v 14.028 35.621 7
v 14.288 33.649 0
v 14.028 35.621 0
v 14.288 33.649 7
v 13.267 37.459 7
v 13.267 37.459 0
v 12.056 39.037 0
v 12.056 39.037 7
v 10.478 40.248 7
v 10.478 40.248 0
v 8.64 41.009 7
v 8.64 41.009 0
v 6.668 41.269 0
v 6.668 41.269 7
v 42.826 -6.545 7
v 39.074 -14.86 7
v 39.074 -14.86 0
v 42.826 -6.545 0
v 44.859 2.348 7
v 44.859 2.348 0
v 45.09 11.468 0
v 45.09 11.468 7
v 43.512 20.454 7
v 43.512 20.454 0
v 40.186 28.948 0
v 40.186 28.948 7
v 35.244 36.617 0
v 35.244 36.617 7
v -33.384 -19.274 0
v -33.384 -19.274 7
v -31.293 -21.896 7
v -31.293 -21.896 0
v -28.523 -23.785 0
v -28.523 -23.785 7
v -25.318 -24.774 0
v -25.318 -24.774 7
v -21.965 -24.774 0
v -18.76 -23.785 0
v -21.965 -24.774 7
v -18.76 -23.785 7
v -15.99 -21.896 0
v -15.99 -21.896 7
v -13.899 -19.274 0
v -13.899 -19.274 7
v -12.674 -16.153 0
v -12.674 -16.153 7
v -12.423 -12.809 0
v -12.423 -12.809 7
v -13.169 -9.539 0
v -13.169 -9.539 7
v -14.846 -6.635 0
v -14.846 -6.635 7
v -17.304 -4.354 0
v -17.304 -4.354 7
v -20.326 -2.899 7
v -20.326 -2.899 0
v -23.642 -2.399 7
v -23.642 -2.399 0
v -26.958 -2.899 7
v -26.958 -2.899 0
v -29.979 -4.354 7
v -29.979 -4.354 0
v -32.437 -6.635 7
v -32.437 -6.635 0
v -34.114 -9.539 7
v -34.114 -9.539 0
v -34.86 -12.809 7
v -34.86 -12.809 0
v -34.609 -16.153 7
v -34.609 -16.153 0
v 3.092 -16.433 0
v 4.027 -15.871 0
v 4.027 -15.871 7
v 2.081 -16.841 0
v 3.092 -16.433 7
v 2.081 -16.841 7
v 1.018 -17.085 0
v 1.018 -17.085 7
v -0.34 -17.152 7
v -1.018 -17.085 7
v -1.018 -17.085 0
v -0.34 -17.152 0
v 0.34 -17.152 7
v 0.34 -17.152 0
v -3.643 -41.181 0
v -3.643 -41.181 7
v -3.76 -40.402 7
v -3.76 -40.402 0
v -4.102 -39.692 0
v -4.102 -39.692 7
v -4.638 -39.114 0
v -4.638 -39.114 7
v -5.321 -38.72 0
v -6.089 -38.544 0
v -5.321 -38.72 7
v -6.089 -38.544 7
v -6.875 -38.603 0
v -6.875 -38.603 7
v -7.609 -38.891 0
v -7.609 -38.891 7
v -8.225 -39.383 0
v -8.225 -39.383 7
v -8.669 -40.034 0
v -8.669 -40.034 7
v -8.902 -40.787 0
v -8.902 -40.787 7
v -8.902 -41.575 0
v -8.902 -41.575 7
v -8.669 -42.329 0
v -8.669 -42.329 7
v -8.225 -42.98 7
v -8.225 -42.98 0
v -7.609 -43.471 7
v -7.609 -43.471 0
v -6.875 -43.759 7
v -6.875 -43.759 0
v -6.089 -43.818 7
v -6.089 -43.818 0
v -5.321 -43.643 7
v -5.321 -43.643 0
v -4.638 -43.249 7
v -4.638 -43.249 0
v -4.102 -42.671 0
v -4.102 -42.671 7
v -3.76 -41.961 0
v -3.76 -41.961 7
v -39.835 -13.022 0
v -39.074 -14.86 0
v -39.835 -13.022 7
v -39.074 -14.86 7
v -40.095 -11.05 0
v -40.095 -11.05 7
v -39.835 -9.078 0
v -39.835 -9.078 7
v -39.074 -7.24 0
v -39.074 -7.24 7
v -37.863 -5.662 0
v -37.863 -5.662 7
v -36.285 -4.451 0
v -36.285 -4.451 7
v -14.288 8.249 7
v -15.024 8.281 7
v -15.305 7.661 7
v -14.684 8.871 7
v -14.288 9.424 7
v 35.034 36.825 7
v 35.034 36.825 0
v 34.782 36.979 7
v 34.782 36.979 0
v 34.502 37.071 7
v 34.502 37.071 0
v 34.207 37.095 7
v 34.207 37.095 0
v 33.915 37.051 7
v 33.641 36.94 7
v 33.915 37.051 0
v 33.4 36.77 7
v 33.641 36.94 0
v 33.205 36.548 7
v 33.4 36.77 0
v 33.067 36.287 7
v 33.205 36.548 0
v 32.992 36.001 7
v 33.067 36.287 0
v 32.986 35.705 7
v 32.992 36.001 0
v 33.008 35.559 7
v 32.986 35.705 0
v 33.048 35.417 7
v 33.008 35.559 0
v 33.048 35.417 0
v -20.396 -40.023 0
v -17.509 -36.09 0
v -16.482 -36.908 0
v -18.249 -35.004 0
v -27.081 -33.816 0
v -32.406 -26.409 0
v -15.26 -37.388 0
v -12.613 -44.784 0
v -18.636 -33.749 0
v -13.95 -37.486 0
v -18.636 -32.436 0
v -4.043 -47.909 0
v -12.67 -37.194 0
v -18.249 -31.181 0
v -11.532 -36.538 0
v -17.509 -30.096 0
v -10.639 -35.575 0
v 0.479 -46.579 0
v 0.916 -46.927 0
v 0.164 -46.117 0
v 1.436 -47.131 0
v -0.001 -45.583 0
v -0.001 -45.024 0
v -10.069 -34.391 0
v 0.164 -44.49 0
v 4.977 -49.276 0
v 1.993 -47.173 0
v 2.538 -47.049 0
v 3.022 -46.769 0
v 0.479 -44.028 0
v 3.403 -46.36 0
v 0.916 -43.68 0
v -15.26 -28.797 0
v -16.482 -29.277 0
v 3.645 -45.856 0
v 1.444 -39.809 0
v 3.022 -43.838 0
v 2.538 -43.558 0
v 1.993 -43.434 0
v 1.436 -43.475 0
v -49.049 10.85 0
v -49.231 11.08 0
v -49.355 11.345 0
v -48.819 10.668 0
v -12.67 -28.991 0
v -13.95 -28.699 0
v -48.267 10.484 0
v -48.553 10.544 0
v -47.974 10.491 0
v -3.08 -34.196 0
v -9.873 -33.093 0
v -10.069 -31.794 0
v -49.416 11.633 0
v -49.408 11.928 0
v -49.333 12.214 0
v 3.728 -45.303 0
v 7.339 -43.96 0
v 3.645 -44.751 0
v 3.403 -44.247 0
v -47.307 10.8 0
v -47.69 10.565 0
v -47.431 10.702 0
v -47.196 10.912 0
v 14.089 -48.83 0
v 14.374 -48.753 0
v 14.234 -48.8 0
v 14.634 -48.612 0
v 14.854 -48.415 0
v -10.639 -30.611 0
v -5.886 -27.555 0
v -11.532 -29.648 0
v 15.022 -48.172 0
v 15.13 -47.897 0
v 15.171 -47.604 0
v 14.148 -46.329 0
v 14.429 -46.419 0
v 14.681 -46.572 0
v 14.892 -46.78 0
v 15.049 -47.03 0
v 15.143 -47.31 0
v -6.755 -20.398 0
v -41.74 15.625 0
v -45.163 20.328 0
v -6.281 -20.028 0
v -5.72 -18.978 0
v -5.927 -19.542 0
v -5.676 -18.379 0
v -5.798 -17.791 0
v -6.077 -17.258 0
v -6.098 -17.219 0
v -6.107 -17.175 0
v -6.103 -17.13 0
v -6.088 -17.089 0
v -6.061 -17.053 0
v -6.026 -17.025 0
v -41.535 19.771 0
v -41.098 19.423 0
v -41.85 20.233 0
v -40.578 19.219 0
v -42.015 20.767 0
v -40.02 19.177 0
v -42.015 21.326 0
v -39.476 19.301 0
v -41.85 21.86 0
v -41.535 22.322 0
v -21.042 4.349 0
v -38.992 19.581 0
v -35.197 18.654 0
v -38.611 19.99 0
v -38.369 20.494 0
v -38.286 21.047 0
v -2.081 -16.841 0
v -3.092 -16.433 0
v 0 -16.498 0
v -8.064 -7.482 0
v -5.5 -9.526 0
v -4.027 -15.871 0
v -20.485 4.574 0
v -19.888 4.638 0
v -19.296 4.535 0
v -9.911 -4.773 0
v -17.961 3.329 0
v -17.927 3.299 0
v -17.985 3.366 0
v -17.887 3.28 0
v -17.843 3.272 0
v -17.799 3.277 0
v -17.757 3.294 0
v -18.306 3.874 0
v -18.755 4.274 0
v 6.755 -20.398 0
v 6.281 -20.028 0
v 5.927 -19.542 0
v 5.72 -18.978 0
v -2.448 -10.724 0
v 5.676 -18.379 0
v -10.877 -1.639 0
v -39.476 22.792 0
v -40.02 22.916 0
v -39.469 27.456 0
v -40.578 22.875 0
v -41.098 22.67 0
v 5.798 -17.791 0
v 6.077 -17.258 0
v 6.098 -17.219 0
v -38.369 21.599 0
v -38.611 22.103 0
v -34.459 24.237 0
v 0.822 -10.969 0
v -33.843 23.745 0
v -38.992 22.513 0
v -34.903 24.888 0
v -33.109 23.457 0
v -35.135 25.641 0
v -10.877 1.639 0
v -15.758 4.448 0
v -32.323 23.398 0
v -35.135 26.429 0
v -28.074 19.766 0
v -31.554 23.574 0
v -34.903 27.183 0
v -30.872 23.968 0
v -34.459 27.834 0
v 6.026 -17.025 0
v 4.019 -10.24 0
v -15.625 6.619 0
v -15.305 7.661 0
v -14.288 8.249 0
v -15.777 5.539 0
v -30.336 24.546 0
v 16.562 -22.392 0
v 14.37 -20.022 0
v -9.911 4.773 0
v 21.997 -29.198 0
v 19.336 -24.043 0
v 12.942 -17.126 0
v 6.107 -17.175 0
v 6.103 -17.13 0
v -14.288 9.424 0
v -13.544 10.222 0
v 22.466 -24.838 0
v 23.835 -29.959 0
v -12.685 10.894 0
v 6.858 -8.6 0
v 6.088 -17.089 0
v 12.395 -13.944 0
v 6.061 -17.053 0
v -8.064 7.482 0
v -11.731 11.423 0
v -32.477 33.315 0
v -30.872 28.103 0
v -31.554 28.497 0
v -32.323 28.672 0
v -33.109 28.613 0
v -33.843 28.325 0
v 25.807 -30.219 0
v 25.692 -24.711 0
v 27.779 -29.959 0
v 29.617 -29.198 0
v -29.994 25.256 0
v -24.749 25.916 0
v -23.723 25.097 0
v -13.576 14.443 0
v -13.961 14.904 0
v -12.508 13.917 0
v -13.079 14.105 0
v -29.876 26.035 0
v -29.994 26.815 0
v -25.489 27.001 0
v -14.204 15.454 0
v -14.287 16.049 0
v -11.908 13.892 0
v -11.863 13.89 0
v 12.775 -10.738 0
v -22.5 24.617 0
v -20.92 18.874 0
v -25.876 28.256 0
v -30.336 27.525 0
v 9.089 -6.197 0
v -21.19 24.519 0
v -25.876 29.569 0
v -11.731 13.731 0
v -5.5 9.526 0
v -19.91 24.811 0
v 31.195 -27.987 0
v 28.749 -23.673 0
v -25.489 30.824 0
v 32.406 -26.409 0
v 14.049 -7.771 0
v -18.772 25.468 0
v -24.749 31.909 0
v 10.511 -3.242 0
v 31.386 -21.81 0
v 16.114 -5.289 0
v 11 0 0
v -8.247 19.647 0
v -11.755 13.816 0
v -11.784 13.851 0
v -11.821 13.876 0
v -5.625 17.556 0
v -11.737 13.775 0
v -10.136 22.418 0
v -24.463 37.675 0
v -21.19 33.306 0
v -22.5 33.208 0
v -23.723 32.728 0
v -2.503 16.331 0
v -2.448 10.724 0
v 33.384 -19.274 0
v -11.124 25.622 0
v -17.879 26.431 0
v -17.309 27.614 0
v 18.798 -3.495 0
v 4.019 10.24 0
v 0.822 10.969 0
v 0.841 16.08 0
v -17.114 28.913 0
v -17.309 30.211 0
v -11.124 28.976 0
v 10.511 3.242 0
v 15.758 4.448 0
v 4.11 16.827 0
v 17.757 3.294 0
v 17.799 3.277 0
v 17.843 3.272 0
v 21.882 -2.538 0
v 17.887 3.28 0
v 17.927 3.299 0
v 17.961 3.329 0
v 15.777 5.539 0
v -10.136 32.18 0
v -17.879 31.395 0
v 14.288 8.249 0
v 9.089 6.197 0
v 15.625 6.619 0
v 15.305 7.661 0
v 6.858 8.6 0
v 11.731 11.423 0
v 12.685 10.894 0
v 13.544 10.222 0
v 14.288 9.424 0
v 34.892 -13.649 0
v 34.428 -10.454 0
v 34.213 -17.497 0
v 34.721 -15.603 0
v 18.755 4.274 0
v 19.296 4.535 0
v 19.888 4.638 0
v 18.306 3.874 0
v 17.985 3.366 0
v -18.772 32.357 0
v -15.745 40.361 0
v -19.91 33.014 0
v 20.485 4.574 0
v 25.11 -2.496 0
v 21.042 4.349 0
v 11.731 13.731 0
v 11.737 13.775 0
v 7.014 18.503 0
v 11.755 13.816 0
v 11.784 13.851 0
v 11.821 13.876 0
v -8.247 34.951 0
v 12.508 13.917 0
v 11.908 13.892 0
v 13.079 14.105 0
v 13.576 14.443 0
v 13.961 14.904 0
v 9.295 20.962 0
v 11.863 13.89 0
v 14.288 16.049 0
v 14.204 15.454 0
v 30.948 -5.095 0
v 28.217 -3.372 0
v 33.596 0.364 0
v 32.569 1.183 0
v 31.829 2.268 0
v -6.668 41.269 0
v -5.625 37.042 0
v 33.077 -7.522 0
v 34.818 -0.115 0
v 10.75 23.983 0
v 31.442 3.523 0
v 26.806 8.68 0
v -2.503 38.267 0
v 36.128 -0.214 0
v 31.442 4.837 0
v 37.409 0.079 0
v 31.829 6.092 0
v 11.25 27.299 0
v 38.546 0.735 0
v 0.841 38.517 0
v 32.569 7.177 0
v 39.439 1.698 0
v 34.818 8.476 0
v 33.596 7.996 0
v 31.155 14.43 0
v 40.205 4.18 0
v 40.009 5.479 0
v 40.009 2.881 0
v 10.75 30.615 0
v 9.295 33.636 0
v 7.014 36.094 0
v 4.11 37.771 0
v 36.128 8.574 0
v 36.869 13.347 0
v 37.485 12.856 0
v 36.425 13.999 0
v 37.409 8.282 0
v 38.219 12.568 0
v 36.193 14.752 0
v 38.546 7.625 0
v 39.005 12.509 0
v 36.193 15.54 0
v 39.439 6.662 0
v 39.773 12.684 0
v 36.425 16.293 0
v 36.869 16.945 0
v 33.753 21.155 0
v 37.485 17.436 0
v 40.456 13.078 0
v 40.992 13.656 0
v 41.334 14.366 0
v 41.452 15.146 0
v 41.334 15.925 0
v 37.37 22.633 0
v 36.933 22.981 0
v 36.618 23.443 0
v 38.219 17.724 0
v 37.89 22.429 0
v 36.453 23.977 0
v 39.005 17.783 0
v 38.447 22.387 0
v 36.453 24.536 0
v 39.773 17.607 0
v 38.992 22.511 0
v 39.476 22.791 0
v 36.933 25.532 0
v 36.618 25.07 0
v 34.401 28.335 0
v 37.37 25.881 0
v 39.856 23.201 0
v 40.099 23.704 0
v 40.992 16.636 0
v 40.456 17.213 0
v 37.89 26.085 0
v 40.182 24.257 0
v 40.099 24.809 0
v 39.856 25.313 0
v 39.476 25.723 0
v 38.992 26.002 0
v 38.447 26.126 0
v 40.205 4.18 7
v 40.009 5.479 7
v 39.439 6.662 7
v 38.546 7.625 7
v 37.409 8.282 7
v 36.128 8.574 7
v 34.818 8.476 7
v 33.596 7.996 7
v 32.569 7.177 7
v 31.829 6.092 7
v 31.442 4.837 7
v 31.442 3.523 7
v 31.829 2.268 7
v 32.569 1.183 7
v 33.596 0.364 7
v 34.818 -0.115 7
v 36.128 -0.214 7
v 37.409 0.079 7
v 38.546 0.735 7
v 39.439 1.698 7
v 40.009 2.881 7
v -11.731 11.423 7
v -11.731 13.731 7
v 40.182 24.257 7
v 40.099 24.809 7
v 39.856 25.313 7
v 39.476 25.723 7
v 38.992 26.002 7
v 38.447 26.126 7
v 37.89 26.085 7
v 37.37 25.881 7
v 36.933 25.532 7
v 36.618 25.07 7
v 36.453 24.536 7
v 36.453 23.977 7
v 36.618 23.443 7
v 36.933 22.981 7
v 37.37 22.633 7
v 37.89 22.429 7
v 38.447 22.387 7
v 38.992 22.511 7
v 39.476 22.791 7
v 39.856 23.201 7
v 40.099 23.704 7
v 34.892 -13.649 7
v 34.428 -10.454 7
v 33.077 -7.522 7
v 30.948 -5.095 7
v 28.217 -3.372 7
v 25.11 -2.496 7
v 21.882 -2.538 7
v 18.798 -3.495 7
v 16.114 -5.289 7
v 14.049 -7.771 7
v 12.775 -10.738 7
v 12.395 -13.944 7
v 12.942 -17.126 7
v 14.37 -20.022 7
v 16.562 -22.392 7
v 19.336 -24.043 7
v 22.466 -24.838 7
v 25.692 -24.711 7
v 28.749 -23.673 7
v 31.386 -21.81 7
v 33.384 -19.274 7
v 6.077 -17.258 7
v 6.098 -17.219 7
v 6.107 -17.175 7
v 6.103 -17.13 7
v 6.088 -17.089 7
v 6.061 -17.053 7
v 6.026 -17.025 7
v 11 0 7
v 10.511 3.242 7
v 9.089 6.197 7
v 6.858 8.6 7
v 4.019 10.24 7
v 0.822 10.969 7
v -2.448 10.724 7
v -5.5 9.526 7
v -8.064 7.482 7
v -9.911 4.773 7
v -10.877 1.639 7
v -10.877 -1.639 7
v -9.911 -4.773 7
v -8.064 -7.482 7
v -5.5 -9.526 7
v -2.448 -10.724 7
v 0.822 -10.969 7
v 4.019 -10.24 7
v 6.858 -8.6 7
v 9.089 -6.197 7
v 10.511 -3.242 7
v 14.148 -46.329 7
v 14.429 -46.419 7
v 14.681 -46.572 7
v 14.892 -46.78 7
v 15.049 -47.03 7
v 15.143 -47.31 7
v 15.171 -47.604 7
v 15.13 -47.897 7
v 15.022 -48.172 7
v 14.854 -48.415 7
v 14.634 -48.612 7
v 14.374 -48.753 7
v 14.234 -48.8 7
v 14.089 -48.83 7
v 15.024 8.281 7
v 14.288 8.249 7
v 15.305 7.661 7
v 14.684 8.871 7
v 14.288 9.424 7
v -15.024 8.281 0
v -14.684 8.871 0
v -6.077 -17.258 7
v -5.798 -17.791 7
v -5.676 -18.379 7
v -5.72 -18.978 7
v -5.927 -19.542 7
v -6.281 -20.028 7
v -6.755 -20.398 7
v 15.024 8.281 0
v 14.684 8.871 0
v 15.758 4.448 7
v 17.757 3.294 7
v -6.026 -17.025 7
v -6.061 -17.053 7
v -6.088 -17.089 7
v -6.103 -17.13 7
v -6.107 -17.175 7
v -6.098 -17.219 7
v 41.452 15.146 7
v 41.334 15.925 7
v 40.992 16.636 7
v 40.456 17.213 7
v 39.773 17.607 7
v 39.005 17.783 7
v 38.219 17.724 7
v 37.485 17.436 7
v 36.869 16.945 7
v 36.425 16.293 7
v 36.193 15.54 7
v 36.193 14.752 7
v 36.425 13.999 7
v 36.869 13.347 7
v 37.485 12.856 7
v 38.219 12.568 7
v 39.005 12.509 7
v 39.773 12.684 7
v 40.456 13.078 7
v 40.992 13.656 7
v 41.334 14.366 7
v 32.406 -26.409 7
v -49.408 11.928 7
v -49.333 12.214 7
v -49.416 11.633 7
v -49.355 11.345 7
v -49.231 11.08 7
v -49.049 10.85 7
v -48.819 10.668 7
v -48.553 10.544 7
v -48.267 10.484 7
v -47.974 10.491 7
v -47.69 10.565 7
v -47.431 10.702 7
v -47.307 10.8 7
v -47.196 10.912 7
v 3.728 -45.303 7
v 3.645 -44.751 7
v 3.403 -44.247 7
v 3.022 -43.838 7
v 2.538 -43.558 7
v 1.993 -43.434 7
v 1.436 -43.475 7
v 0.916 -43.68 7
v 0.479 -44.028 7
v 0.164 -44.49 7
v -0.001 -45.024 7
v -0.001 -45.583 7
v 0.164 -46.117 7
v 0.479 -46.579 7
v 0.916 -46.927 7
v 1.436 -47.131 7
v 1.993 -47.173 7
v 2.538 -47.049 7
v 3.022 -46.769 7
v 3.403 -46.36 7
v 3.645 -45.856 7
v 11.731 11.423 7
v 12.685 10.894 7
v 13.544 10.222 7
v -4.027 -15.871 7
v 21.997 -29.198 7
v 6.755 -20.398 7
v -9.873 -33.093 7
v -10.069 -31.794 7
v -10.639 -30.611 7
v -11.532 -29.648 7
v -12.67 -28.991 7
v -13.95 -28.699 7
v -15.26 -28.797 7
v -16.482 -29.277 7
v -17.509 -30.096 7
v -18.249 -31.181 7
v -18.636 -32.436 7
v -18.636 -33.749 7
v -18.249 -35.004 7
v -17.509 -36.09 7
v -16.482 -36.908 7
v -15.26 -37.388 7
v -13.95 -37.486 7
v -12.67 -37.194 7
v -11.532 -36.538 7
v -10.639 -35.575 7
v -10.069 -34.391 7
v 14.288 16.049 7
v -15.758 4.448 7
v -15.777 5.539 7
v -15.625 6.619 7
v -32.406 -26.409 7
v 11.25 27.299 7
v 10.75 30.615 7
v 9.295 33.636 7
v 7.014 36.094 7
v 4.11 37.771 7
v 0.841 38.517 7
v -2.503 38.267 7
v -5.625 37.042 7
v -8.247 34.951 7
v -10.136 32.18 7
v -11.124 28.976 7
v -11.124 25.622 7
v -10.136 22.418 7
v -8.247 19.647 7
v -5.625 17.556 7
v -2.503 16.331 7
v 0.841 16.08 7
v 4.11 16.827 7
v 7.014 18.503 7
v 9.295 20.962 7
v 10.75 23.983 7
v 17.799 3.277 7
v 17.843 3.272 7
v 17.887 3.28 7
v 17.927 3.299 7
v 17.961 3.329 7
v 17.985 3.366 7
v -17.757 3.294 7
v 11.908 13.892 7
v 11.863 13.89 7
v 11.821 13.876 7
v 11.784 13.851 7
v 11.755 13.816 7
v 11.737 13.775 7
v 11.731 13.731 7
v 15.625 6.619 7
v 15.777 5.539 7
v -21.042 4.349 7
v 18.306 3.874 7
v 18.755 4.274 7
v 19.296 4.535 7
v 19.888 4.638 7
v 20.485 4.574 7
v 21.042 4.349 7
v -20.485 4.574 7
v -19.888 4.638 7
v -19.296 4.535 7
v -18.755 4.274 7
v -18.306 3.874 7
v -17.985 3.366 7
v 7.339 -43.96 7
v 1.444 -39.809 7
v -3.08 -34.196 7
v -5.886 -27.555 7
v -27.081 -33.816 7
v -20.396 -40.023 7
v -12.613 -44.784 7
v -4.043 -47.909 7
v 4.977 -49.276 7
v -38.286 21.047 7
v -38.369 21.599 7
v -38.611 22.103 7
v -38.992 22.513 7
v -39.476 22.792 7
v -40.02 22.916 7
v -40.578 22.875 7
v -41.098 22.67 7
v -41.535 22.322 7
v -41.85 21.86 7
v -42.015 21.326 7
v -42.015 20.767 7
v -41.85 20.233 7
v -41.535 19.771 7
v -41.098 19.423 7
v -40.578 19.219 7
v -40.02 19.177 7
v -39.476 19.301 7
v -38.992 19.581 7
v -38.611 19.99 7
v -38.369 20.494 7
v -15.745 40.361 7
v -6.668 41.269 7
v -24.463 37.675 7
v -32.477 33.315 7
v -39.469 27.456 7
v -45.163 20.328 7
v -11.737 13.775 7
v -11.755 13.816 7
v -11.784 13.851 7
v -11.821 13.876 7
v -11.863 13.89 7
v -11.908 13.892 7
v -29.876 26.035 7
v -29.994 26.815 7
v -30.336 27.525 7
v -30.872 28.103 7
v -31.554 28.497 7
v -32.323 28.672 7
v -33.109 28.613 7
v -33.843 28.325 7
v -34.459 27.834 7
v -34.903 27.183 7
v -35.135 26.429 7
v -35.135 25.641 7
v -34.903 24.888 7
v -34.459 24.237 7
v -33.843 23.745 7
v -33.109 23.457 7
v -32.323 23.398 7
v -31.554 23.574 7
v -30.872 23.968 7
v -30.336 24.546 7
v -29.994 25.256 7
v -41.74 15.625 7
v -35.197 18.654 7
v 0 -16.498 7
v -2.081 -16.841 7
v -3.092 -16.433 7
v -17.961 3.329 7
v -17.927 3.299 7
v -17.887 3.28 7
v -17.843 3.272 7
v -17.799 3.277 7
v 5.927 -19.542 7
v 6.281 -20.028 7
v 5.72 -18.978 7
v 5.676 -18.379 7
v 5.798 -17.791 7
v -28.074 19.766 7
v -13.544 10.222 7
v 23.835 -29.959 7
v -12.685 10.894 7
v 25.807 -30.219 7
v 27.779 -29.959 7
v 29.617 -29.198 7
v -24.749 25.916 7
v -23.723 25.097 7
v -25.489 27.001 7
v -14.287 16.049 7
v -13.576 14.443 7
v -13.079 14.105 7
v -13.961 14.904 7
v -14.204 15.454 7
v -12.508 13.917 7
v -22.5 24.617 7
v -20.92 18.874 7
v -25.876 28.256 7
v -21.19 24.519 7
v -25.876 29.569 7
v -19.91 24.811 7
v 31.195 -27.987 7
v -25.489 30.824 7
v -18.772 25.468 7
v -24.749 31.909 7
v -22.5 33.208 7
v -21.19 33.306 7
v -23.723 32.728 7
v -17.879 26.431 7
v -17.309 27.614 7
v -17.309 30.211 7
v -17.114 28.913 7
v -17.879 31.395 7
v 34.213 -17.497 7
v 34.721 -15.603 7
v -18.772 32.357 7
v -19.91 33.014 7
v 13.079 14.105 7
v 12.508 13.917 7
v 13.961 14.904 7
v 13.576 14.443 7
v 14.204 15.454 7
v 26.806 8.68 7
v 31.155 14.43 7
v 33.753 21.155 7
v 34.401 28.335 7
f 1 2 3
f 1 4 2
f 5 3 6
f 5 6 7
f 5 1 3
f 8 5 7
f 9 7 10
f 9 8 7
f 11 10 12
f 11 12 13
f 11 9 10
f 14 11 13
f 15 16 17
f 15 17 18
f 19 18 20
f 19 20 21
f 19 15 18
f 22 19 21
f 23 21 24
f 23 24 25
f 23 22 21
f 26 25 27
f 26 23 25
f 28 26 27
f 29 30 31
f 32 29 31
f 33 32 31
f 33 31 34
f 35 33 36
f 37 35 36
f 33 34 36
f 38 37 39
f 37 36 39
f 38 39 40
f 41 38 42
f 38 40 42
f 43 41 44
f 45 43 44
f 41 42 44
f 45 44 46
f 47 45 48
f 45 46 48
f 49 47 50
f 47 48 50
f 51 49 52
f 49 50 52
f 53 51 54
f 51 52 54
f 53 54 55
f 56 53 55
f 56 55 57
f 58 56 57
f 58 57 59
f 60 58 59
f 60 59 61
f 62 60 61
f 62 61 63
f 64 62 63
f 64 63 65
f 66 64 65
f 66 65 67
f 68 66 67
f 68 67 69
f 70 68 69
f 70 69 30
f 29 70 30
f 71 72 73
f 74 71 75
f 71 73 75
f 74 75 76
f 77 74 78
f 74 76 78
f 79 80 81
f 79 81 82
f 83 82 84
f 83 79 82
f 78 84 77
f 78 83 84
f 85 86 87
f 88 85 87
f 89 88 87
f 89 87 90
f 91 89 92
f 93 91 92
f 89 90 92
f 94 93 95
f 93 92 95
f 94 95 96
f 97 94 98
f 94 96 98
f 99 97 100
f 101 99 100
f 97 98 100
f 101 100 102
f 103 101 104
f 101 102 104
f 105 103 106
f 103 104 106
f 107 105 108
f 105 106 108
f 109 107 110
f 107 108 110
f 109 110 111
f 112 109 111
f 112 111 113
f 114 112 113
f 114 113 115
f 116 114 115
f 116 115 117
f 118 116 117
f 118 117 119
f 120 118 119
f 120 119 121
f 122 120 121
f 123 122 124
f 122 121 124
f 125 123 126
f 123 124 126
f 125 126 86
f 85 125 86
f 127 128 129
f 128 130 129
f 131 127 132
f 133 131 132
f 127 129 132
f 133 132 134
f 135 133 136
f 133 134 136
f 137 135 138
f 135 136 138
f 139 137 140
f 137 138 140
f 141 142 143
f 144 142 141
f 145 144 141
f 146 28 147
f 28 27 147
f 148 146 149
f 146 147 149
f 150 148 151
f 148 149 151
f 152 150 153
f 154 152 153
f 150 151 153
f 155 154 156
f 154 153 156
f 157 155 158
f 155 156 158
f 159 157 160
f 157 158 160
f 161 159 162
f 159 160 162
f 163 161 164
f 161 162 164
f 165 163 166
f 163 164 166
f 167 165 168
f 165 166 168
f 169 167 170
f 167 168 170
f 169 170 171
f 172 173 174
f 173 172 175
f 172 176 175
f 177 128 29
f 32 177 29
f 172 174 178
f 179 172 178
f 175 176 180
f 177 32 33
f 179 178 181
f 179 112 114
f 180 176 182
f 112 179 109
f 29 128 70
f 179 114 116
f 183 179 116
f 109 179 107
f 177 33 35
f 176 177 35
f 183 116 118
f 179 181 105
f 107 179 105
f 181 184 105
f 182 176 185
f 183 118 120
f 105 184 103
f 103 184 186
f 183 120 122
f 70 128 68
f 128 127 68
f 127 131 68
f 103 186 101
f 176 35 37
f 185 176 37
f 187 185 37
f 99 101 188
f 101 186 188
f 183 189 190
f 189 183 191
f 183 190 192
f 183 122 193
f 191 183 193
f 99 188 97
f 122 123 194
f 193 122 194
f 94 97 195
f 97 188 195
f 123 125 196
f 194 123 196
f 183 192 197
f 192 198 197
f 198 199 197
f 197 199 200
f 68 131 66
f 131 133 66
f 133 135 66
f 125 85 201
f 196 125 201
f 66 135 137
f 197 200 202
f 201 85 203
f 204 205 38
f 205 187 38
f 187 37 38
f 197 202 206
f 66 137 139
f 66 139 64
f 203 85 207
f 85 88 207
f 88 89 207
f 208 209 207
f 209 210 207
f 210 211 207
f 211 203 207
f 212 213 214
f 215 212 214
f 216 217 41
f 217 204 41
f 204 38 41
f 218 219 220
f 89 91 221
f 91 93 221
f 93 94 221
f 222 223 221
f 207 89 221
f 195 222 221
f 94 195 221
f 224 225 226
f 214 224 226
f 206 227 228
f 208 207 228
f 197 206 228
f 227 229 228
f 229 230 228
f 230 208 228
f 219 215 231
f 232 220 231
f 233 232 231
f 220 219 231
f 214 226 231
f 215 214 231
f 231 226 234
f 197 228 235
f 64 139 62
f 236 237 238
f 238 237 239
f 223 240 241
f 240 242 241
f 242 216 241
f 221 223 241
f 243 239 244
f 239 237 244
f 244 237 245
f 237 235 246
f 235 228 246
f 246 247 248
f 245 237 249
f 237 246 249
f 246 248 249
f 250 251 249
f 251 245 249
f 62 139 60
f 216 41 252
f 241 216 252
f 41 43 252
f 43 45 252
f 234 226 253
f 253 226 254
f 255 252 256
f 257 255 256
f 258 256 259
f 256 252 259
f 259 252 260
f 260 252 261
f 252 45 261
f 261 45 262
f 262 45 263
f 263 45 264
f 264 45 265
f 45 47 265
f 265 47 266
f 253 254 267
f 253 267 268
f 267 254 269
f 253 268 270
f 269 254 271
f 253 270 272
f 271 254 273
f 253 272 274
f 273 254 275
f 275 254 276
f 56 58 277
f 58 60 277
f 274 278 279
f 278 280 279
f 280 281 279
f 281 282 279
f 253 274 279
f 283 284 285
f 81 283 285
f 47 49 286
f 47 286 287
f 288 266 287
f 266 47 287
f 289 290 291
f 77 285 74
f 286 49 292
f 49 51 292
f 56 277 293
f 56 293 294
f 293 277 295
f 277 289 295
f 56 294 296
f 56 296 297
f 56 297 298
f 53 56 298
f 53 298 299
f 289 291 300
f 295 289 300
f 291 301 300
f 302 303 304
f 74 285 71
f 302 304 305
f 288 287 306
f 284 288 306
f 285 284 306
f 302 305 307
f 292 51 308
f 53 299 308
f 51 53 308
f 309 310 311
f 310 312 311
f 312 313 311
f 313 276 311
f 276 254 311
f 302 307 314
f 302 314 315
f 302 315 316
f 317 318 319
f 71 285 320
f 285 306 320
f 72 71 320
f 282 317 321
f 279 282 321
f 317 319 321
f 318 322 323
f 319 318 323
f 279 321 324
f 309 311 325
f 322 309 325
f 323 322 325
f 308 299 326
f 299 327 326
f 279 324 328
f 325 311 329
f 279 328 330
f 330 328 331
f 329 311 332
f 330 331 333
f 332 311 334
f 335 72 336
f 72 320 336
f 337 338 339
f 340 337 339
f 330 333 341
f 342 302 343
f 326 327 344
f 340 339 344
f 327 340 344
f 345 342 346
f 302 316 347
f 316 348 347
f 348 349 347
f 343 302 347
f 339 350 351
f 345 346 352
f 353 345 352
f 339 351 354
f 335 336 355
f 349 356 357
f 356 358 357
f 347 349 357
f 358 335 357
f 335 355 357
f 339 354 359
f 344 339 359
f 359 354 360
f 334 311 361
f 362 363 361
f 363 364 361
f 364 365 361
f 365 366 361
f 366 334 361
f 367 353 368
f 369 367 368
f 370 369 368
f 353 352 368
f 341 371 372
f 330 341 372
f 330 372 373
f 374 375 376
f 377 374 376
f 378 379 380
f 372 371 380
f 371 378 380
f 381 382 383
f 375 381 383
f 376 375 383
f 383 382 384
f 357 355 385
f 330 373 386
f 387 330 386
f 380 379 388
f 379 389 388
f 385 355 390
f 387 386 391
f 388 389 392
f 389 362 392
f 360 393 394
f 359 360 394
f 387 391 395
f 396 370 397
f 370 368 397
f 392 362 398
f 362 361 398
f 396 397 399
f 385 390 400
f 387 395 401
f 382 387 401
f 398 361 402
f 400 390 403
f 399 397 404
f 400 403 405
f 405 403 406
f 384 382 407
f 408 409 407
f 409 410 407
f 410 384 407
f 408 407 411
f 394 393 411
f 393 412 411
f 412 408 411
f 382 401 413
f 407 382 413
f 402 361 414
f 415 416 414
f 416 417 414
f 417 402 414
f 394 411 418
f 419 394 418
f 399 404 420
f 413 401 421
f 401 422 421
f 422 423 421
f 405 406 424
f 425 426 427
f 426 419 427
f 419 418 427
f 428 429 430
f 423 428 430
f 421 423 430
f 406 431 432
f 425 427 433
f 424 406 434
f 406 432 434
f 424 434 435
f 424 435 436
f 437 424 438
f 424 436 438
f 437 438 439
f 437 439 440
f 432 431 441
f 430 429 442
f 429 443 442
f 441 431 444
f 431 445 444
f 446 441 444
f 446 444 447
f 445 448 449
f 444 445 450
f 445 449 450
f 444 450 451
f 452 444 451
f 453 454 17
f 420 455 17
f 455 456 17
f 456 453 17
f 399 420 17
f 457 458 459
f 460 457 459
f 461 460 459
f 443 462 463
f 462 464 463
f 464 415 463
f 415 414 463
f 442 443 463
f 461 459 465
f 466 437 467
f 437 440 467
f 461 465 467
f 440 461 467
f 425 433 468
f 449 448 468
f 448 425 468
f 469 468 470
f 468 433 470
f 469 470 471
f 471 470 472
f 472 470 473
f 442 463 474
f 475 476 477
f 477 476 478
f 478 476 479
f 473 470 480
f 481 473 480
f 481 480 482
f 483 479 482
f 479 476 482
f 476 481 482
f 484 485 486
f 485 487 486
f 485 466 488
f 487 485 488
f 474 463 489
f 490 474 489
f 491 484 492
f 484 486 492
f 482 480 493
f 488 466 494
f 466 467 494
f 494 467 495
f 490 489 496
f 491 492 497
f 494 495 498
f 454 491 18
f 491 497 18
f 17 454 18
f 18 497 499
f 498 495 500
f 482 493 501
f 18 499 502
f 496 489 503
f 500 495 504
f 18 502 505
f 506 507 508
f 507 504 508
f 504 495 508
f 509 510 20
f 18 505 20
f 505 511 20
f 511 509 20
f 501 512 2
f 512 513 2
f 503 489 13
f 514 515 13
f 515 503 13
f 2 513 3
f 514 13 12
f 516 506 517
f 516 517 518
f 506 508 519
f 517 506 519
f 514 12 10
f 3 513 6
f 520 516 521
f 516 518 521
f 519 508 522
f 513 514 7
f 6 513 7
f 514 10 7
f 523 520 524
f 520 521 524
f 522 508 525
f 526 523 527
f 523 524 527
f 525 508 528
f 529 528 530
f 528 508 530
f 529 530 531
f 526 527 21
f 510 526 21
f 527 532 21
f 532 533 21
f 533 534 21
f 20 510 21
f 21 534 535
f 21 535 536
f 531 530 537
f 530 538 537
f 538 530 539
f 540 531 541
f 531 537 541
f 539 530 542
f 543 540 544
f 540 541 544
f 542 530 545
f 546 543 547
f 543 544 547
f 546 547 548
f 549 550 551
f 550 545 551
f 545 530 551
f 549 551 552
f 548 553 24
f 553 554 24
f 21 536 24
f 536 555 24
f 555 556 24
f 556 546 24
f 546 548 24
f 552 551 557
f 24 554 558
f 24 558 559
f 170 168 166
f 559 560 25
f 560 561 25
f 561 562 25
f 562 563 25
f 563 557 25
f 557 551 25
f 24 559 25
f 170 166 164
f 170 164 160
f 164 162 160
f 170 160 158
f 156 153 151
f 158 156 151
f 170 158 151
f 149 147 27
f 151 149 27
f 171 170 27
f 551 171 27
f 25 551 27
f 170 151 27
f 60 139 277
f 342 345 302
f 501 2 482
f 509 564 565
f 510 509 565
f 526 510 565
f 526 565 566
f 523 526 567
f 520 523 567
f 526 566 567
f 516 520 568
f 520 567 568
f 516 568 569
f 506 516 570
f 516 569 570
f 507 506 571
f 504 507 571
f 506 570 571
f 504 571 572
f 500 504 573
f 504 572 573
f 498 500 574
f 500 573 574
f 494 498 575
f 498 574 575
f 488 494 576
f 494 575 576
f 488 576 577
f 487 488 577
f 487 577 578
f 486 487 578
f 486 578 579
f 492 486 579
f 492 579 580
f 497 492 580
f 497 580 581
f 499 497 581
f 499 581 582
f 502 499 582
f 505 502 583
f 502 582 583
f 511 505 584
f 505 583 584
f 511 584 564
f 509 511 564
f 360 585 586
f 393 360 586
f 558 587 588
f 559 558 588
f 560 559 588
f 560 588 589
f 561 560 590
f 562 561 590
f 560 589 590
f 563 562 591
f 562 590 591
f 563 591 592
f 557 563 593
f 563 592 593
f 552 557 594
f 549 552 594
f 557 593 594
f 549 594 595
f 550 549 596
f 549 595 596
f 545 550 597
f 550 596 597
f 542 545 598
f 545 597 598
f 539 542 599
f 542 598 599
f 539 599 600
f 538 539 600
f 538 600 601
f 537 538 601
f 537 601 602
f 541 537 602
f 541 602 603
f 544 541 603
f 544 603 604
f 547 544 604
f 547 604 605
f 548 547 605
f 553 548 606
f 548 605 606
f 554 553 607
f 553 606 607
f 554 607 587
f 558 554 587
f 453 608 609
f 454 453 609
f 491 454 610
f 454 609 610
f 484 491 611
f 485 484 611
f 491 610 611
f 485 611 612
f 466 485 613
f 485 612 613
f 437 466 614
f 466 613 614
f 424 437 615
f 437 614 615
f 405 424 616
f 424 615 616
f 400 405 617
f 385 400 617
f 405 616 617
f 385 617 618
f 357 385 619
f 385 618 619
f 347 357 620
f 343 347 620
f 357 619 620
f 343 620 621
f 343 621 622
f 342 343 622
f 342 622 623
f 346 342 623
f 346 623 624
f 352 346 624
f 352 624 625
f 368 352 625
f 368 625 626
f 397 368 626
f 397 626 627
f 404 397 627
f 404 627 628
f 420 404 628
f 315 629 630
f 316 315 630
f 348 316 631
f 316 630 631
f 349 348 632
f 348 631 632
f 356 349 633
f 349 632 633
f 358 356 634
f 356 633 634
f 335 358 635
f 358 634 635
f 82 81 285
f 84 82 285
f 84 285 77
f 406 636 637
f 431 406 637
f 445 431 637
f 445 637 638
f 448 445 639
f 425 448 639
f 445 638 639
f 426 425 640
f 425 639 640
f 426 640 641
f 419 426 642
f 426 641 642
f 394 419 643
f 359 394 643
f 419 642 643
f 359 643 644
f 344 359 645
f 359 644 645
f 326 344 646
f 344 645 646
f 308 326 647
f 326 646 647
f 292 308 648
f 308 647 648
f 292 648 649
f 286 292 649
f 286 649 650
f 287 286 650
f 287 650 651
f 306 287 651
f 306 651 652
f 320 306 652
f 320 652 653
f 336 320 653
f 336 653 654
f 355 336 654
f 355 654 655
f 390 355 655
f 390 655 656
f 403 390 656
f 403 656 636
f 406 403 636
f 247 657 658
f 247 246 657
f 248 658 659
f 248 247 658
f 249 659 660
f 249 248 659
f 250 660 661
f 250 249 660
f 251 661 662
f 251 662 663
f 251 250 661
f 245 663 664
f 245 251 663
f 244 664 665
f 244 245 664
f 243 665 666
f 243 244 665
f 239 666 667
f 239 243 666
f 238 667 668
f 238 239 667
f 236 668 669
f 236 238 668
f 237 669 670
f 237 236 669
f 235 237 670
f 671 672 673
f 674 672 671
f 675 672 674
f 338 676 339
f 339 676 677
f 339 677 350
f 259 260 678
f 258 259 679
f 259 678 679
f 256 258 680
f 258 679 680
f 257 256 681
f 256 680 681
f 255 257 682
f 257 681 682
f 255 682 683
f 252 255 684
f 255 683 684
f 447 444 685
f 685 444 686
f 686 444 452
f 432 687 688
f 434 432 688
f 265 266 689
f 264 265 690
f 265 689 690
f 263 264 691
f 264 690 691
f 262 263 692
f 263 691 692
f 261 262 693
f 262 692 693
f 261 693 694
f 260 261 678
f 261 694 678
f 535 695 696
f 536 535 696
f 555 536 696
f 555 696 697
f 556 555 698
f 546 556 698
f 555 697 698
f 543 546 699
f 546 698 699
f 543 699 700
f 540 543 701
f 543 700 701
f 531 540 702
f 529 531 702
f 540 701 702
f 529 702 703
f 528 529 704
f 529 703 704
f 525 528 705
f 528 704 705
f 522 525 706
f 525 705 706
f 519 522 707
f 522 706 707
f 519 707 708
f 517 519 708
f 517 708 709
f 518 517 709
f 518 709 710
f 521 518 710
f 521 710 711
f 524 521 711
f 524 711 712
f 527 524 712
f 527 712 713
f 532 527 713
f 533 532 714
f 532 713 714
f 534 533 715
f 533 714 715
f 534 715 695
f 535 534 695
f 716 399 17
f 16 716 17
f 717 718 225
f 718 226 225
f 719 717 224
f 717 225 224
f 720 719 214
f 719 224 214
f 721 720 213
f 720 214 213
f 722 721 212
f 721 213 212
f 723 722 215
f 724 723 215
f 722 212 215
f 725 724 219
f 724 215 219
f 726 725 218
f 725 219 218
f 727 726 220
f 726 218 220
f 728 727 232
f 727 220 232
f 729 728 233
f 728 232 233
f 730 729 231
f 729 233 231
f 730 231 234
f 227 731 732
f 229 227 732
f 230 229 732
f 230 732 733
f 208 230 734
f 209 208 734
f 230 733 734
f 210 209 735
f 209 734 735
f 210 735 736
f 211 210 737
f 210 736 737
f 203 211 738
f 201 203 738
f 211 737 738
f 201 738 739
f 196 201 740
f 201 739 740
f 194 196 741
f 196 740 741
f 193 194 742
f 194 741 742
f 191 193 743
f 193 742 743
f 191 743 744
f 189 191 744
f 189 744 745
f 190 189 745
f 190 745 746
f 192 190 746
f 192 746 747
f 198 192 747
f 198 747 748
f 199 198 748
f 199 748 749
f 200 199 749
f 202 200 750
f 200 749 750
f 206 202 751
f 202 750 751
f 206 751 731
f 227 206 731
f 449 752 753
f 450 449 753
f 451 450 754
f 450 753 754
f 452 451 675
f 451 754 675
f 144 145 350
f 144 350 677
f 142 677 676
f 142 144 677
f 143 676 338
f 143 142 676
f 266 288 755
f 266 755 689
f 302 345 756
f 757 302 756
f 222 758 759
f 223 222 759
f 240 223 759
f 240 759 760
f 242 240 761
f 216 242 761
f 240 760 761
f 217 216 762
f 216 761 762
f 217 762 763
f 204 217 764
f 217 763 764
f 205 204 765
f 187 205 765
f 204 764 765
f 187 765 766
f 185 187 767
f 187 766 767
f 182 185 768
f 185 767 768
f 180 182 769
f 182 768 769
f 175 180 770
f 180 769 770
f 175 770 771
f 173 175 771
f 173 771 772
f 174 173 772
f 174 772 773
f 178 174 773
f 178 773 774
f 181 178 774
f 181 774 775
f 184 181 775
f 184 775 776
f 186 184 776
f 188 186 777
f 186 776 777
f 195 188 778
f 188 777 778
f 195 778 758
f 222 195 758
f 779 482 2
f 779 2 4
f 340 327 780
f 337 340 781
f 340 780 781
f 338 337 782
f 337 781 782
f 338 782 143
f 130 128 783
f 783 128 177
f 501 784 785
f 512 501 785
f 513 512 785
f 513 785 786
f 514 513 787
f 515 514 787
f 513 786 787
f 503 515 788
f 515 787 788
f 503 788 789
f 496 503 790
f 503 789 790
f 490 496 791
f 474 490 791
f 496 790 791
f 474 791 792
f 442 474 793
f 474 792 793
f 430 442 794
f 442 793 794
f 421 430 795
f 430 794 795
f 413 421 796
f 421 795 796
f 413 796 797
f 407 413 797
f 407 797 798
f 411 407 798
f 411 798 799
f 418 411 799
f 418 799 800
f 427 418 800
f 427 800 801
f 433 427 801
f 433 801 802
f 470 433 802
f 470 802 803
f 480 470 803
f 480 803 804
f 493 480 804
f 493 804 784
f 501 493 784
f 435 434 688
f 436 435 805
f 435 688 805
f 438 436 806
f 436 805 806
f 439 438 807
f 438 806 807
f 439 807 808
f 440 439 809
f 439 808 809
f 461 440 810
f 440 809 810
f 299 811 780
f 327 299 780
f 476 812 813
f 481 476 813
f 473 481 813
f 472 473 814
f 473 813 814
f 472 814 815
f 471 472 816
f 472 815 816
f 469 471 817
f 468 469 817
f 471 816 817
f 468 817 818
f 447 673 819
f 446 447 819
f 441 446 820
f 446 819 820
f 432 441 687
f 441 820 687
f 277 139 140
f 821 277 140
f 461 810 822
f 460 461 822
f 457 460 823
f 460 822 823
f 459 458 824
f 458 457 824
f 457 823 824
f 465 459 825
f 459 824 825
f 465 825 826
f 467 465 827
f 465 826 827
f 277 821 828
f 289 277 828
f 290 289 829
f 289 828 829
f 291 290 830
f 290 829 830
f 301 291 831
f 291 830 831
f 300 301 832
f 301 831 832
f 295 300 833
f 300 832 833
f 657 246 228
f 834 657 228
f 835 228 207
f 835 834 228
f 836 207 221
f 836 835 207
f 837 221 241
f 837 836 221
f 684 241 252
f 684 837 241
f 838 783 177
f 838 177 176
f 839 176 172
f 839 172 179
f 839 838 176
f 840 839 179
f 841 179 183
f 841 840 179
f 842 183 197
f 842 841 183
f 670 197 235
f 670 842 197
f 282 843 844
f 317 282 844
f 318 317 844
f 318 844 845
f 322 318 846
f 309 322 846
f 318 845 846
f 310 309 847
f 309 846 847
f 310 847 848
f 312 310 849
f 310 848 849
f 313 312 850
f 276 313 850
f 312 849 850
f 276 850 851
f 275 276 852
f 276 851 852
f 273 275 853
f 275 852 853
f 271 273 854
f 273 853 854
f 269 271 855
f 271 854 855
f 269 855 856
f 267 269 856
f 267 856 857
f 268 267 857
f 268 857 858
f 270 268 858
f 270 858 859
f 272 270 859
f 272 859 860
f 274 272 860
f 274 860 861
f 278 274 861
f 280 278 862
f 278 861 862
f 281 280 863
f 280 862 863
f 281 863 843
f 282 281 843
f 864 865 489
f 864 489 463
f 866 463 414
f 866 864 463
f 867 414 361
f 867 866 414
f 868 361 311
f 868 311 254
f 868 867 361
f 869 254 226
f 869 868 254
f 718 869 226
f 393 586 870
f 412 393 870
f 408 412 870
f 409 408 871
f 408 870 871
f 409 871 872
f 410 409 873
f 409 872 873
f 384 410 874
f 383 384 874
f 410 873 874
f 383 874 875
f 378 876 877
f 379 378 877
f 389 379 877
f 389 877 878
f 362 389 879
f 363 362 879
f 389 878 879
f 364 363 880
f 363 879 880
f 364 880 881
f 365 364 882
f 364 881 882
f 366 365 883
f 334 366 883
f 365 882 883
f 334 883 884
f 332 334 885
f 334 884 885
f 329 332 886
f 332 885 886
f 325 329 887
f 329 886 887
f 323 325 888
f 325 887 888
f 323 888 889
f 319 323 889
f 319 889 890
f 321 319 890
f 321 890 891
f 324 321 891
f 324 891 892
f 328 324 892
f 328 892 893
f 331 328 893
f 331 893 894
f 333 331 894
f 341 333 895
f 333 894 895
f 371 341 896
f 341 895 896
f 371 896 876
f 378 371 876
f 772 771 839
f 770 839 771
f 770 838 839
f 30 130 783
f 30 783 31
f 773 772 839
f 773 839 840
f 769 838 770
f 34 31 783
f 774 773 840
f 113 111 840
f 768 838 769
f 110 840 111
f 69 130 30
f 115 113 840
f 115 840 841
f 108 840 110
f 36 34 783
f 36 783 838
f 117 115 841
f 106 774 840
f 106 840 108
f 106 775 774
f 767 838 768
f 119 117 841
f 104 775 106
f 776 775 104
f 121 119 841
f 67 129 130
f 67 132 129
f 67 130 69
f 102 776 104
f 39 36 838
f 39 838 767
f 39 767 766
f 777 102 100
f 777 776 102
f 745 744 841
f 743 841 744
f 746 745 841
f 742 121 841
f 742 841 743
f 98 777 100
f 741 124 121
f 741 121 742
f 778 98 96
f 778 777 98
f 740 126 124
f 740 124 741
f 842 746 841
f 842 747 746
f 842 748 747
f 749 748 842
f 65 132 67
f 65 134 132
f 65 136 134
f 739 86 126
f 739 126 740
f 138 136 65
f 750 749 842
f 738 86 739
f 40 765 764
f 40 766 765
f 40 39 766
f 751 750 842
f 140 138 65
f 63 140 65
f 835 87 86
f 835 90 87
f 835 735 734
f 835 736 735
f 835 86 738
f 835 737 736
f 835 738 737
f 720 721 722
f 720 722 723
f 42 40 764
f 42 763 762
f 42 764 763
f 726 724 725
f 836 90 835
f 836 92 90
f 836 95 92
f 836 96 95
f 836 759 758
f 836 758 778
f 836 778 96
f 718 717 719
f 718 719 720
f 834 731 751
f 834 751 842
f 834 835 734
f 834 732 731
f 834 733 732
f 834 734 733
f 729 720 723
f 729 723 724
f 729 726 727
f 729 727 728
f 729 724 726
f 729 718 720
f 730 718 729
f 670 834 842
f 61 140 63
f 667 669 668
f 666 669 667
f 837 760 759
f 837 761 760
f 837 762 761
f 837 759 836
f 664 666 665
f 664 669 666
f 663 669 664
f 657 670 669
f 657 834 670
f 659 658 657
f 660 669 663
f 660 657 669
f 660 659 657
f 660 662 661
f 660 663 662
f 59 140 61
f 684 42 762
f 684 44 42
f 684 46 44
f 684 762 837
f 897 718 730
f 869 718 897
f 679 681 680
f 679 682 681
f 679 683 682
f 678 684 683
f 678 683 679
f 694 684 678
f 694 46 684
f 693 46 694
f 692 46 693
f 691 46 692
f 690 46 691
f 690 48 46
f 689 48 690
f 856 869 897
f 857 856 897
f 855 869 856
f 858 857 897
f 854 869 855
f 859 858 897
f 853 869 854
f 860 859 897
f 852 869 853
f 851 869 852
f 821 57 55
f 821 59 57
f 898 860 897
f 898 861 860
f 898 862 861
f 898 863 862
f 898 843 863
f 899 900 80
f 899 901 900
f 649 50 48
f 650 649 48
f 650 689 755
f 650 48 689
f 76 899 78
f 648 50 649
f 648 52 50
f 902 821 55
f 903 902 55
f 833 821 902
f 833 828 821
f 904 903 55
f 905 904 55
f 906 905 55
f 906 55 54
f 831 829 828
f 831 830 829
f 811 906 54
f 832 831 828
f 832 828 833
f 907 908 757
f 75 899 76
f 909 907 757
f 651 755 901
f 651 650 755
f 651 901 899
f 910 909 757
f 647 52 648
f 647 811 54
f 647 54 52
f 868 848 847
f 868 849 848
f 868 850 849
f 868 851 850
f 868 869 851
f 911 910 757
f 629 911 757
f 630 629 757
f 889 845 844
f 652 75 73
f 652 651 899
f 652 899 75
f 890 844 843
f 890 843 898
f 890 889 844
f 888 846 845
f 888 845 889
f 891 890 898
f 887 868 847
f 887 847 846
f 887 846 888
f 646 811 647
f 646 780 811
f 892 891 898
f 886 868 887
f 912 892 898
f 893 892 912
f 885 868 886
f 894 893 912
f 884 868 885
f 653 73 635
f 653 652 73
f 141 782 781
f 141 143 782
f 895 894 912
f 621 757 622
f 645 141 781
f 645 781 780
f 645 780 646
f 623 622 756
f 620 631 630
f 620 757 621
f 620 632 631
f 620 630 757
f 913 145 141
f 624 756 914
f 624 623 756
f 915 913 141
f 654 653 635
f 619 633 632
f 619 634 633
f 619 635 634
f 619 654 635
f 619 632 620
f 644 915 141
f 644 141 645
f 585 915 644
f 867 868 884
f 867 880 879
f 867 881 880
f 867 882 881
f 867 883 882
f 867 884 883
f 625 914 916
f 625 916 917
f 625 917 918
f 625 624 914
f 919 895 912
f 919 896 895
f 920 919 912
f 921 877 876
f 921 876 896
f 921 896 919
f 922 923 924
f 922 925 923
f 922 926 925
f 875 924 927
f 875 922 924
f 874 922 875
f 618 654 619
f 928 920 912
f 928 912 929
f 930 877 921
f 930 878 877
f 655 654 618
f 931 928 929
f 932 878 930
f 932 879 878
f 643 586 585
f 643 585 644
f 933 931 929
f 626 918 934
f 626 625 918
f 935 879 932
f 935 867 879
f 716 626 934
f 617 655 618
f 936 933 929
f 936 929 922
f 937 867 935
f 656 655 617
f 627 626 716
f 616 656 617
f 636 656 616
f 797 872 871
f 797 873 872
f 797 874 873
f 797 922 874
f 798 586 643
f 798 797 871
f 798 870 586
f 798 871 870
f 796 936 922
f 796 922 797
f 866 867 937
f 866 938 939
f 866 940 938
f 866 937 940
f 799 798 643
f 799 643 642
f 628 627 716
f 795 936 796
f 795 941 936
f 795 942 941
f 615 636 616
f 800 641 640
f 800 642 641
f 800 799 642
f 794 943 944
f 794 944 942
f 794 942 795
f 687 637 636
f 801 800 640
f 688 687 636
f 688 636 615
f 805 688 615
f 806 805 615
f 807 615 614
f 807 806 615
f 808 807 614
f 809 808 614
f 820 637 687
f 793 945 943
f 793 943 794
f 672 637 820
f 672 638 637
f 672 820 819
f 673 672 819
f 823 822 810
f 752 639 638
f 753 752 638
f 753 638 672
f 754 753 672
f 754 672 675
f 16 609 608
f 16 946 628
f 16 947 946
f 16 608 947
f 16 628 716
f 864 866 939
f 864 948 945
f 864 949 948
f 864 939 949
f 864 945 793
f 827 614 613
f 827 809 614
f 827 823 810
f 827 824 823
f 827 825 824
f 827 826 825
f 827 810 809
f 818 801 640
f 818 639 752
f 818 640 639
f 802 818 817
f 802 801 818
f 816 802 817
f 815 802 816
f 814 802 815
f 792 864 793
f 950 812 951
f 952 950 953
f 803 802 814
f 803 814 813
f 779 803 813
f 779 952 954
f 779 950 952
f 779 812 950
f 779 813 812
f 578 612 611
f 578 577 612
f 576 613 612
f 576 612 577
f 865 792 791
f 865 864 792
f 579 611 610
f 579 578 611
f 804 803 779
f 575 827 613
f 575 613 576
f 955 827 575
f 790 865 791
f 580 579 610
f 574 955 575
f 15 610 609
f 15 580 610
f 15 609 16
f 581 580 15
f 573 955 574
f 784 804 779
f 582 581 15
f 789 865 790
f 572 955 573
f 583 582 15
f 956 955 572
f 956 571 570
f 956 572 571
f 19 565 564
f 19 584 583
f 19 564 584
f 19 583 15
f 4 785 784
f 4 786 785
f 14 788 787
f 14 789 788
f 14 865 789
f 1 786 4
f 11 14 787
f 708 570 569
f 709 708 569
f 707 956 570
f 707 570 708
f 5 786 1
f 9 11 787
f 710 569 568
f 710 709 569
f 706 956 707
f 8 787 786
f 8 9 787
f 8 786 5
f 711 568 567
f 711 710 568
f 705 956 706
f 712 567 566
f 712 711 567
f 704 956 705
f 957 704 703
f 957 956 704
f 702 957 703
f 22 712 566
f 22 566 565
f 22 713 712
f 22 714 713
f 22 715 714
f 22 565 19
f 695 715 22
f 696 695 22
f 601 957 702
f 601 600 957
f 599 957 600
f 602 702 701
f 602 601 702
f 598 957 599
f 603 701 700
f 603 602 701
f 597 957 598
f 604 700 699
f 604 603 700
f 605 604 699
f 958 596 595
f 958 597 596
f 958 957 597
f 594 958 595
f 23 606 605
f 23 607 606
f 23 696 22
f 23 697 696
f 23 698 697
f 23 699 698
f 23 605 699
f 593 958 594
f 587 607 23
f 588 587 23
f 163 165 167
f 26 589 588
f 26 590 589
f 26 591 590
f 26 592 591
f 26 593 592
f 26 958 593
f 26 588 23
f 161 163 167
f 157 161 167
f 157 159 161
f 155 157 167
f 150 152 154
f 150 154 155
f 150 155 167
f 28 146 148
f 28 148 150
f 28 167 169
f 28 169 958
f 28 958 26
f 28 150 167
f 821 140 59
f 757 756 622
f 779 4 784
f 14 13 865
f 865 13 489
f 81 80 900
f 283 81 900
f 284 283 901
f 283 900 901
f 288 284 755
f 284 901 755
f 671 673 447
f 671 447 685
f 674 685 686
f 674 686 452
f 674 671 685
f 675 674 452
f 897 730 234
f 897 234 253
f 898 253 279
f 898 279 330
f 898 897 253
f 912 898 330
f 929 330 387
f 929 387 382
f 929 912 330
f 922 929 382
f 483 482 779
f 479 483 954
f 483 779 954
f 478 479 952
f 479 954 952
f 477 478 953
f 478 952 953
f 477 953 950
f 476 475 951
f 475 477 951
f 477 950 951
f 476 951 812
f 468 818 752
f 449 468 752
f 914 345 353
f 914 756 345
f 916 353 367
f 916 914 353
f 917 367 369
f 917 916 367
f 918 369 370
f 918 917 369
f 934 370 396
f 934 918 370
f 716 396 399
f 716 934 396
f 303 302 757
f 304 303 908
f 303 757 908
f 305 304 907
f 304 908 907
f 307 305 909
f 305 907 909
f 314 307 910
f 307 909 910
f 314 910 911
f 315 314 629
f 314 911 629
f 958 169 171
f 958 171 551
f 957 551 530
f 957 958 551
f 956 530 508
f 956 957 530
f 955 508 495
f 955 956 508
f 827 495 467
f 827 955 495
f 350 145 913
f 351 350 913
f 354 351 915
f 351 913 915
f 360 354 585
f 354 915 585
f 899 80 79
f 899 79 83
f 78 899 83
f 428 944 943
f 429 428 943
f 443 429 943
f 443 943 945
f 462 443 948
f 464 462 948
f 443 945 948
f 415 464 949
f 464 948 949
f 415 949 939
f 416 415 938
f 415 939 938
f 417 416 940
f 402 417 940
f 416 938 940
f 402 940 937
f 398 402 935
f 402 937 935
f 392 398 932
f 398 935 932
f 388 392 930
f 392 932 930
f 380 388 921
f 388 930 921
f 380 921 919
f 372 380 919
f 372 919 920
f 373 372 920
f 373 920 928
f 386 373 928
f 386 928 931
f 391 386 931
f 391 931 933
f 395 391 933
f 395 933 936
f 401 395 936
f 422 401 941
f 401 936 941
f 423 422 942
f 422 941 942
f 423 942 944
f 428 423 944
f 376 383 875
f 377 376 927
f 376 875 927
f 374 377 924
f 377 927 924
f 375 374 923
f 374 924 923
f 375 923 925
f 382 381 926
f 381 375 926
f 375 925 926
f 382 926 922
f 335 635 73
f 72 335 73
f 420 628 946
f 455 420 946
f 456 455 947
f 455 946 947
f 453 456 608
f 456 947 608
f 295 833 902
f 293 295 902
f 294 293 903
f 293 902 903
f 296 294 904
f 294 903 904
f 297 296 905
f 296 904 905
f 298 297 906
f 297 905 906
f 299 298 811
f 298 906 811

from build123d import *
from build123d import SkipClean  # not in build123d's __all__

# Parameters (mm, degrees)
F1_DEPTH  = 7
F2_DEPTH  = 33.02
F3_DEPTH  = 33.02
F4_DEPTH  = 33.02
F6_R      = 7.62
F5_R      = 11.25
F5_R_2    = 11
F7_DEPTH  = 25.4
F8_R      = 1.8749848785
F8_R_2    = 2.6443594024
F8_R_3    = 4.4059759684
F9_DEPTH  = 7
F10_R     = 1.27
F12_DEPTH = 25.4
F13_DEPTH = 7


with BuildPart() as f1:
    # F0 (on Top) → F1 (new body)
    with BuildSketch(Plane.XY):
        Polygon((14.2875, 8.248891971), (-14.2875, 8.248891971), (0, -16.4977839421), align=None)
    extrude(amount=F1_DEPTH)

    # F2 (add): a face of the model
    f2_faces = [f1.faces().sort_by_distance(p)[0] for p in [
        (-7.14375, -4.1244459855, 3.5),
    ]]
    extrude(f2_faces, amount=F2_DEPTH)

    # F3 (add): a face of the model
    f3_faces = [f1.faces().sort_by_distance(p)[0] for p in [
        (0, 8.248891971, 3.5),
    ]]
    extrude(f3_faces, amount=F3_DEPTH)

    # F4 (add): a face of the model
    f4_faces = [f1.faces().sort_by_distance(p)[0] for p in [
        (7.14375, -4.1244459855, 3.5),
    ]]
    extrude(f4_faces, amount=F4_DEPTH)

    # F6
    f6_edges = [f1.edges().sort_by_distance(p)[0] for p in [
        (-42.883659, -8.261108, 3.5),
        (-28.596159, -33.007784, 3.5),
        (28.596159, -33.007784, 3.5),
        (42.883659, -8.261108, 3.5),
        (14.2875, 41.268892, 3.5),
        (-14.2875, 41.268892, 3.5),
    ]]
    fillet(f6_edges, radius=F6_R)

    # F5 (on face) → F7 (cut)
    with BuildSketch(Plane.XY.offset(7)):
        with Locations((0, 27.298891971)):
            Circle(F5_R)
        Circle(F5_R_2)
        with BuildLine():
            ThreePointArc((34.8915339421, -13.6494459855), (12.7748683963, -10.7377317281), (33.3843197347, -19.2744459855))
            ThreePointArc((33.3843197347, -19.2744459855), (34.5081994878, -16.5611602429), (34.8915339421, -13.6494459855))
        make_face()
        with BuildLine():
            ThreePointArc((-12.3915339421, -13.6494459855), (-26.5532481995, -2.7827804398), (-33.3843197347, -19.2744459855))
            ThreePointArc((-33.3843197347, -19.2744459855), (-20.7298196847, -24.5161115313), (-12.3915339421, -13.6494459855))
        make_face()
    extrude(amount=-F7_DEPTH, mode=Mode.SUBTRACT)

    # F8 (on face) → F9 (join)
    with BuildSketch(Plane.XY.offset(7)):
        with BuildLine():
            ThreePointArc((-14.2875, 33.648891971), (-12.0556536726, 39.0370456437), (-6.6675, 41.268891971))
            ThreePointArc((-6.6675, 41.268891971), (-36.1939537613, 30.4970950948), (-51.8477511168, 3.2427063104))
            ThreePointArc((-51.8477511168, 3.2427063104), (-36.0457855424, 18.3806746008), (-14.2875, 16.048891971))
            Line((-14.2875, 16.048891971), (-14.2875, 33.648891971))
        make_face()
        with Locations((-40.1606029761, 21.0467017921)):
            Circle(F8_R, mode=Mode.SUBTRACT)
        with Locations((-32.5204535481, 26.0352350988)):
            Circle(F8_R_2, mode=Mode.SUBTRACT)
        with Locations((-21.5195283201, 28.9126522448)):
            Circle(F8_R_3, mode=Mode.SUBTRACT)
        with BuildLine():
            ThreePointArc((23.1156095166, -46.5228227514), (2.1047616282, -40.4069032795), (-6.7549981495, -20.3977839421))
            Line((-6.7549981495, -20.3977839421), (-21.9970452561, -29.1977839421))
            ThreePointArc((-21.9970452561, -29.1977839421), (-27.7792463798, -29.9590251616), (-32.406158833, -26.4086703653))
            ThreePointArc((-32.406158833, -26.4086703653), (-8.3142822131, -46.5934309681), (23.1156095166, -46.5228227514))
        make_face()
        with Locations((-6.286948215, -41.1811564646)):
            Circle(F8_R_2, mode=Mode.SUBTRACT)
        with Locations((-14.2793271748, -33.092784325)):
            Circle(F8_R_3, mode=Mode.SUBTRACT)
        with Locations((1.8533230702, -45.3034533047)):
            Circle(F8_R, mode=Mode.SUBTRACT)
        with BuildLine():
            Line((21.0424981495, 4.348891971), (21.3499965498, 4.1713576869))
            Line((21.3499965498, 4.1713576869), (36.2845452561, -4.451108029))
            ThreePointArc((36.2845452561, -4.451108029), (39.8349000524, -9.0780204821), (39.073658833, -14.8602216058))
            ThreePointArc((39.073658833, -14.8602216058), (44.5082359744, 16.0963358733), (28.7321416002, 43.280116441))
            ThreePointArc((28.7321416002, 43.280116441), (33.9410239142, 22.0262286786), (21.0424981495, 4.348891971))
        make_face()
        with Locations((35.7988554948, 4.1801320802)):
            Circle(F8_R_3, mode=Mode.SUBTRACT)
        with Locations((38.8074017631, 15.1459213658)):
            Circle(F8_R_2, mode=Mode.SUBTRACT)
        with Locations((38.3072799059, 24.2567515126)):
            Circle(F8_R, mode=Mode.SUBTRACT)
    extrude(amount=-F9_DEPTH)

    # F10
    f10_edges = [f1.edges().sort_by_distance(p)[0] for p in [
        (28.732142, 43.280116, 3.5),
        (23.11561, -46.522823, 3.5),
        (-51.847751, 3.242706, 3.5),
    ]]
    fillet(f10_edges, radius=F10_R)

    # F11 (on face) → F12 (cut)
    with BuildSketch(Plane.XY.offset(7)):
        with BuildLine():
            ThreePointArc((-15.7584187023, 4.4480611953), (-15.7224513331, 6.0815584331), (-15.3052551523, 7.6612907599))
            Line((-15.3052551523, 7.6612907599), (-21.0424981495, 4.348891971))
            ThreePointArc((-21.0424981495, 4.348891971), (-19.2958492313, 4.5353251977), (-17.9847825572, 3.3662897117))
            ThreePointArc((-17.9847825572, 3.3662897117), (-17.8870097802, 3.2797249828), (-17.7572116819, 3.2940575304))
            Line((-17.7572116819, 3.2940575304), (-15.7584187023, 4.4480611953))
        make_face()
        with BuildLine():
            ThreePointArc((-11.9076836854, 13.8921337202), (-13.5756314513, 14.443033023), (-14.2875, 16.048891971))
            Line((-14.2875, 16.048891971), (-14.2875, 9.4240943934))
            ThreePointArc((-14.2875, 9.4240943934), (-13.1280097642, 10.5752630477), (-11.7313433439, 11.423160322))
            Line((-11.7313433439, 11.423160322), (-11.7313433439, 13.7311676517))
            ThreePointArc((-11.7313433439, 13.7311676517), (-11.7838300426, 13.850742376), (-11.9076836854, 13.8921337202))
        make_face()
        with BuildLine():
            ThreePointArc((-6.0770988718, -17.2584234319), (-5.72021778, -18.9783582208), (-6.7549981495, -20.3977839421))
            Line((-6.7549981495, -20.3977839421), (-1.0177551523, -17.0853851533))
            ThreePointArc((-1.0177551523, -17.0853851533), (-2.5944415689, -16.6568214807), (-4.0270753584, -15.8712215173))
            Line((-4.0270753584, -15.8712215173), (-6.0258683381, -17.0252251822))
            ThreePointArc((-6.0258683381, -17.0252251822), (-6.1031797376, -17.1304673587), (-6.0770988718, -17.2584234319))
        make_face()
        with BuildLine():
            ThreePointArc((4.0270753584, -15.8712215173), (2.5944415689, -16.6568214807), (1.0177551523, -17.0853851533))
            Line((1.0177551523, -17.0853851533), (6.7549981495, -20.3977839421))
            ThreePointArc((6.7549981495, -20.3977839421), (5.72021778, -18.9783582208), (6.0770988718, -17.2584234319))
            ThreePointArc((6.0770988718, -17.2584234319), (6.1031797376, -17.1304673587), (6.0258683381, -17.0252251822))
            Line((6.0258683381, -17.0252251822), (4.0270753584, -15.8712215173))
        make_face()
        with BuildLine():
            Line((21.0424981495, 4.348891971), (15.3052551523, 7.6612907599))
            ThreePointArc((15.3052551523, 7.6612907599), (15.7224513331, 6.0815584331), (15.7584187023, 4.4480611953))
            Line((15.7584187023, 4.4480611953), (17.7572116819, 3.2940575304))
            ThreePointArc((17.7572116819, 3.2940575304), (17.8870097802, 3.2797249828), (17.9847825572, 3.3662897117))
            ThreePointArc((17.9847825572, 3.3662897117), (19.2958492313, 4.5353251977), (21.0424981495, 4.348891971))
        make_face()
        with BuildLine():
            Line((14.2875, 9.4240943934), (14.2875, 16.048891971))
            ThreePointArc((14.2875, 16.048891971), (13.5756314513, 14.443033023), (11.9076836854, 13.8921337202))
            ThreePointArc((11.9076836854, 13.8921337202), (11.7838300426, 13.850742376), (11.7313433439, 13.7311676517))
            Line((11.7313433439, 13.7311676517), (11.7313433439, 11.423160322))
            ThreePointArc((11.7313433439, 11.423160322), (13.1280097642, 10.5752630477), (14.2875, 9.4240943934))
        make_face()
    extrude(amount=-F12_DEPTH, mode=Mode.SUBTRACT)

    # F11 (on face) → F13 (join)
    with BuildSketch(Plane.XY.offset(7)):
        with BuildLine():
            Line((-14.2875, 8.248891971), (-14.2875, 9.4240943934))
            ThreePointArc((-14.2875, 9.4240943934), (-14.8614145652, 8.5802416998), (-15.3052551523, 7.6612907599))
            Line((-15.3052551523, 7.6612907599), (-14.2875, 8.248891971))
        make_face()
        with BuildLine():
            Line((0, -16.4977839421), (-1.0177551523, -17.0853851533))
            ThreePointArc((-1.0177551523, -17.0853851533), (0, -17.1604833996), (1.0177551523, -17.0853851533))
            Line((1.0177551523, -17.0853851533), (0, -16.4977839421))
        make_face()
        with BuildLine():
            ThreePointArc((15.3052551523, 7.6612907599), (14.8614145652, 8.5802416998), (14.2875, 9.4240943934))
            Line((14.2875, 9.4240943934), (14.2875, 8.248891971))
            Line((14.2875, 8.248891971), (15.3052551523, 7.6612907599))
        make_face()
    with SkipClean():  # cleaning this boolean's faces spoils the solid; the shape is the same uncleaned
        extrude(amount=-F13_DEPTH)


solid = f1.part
